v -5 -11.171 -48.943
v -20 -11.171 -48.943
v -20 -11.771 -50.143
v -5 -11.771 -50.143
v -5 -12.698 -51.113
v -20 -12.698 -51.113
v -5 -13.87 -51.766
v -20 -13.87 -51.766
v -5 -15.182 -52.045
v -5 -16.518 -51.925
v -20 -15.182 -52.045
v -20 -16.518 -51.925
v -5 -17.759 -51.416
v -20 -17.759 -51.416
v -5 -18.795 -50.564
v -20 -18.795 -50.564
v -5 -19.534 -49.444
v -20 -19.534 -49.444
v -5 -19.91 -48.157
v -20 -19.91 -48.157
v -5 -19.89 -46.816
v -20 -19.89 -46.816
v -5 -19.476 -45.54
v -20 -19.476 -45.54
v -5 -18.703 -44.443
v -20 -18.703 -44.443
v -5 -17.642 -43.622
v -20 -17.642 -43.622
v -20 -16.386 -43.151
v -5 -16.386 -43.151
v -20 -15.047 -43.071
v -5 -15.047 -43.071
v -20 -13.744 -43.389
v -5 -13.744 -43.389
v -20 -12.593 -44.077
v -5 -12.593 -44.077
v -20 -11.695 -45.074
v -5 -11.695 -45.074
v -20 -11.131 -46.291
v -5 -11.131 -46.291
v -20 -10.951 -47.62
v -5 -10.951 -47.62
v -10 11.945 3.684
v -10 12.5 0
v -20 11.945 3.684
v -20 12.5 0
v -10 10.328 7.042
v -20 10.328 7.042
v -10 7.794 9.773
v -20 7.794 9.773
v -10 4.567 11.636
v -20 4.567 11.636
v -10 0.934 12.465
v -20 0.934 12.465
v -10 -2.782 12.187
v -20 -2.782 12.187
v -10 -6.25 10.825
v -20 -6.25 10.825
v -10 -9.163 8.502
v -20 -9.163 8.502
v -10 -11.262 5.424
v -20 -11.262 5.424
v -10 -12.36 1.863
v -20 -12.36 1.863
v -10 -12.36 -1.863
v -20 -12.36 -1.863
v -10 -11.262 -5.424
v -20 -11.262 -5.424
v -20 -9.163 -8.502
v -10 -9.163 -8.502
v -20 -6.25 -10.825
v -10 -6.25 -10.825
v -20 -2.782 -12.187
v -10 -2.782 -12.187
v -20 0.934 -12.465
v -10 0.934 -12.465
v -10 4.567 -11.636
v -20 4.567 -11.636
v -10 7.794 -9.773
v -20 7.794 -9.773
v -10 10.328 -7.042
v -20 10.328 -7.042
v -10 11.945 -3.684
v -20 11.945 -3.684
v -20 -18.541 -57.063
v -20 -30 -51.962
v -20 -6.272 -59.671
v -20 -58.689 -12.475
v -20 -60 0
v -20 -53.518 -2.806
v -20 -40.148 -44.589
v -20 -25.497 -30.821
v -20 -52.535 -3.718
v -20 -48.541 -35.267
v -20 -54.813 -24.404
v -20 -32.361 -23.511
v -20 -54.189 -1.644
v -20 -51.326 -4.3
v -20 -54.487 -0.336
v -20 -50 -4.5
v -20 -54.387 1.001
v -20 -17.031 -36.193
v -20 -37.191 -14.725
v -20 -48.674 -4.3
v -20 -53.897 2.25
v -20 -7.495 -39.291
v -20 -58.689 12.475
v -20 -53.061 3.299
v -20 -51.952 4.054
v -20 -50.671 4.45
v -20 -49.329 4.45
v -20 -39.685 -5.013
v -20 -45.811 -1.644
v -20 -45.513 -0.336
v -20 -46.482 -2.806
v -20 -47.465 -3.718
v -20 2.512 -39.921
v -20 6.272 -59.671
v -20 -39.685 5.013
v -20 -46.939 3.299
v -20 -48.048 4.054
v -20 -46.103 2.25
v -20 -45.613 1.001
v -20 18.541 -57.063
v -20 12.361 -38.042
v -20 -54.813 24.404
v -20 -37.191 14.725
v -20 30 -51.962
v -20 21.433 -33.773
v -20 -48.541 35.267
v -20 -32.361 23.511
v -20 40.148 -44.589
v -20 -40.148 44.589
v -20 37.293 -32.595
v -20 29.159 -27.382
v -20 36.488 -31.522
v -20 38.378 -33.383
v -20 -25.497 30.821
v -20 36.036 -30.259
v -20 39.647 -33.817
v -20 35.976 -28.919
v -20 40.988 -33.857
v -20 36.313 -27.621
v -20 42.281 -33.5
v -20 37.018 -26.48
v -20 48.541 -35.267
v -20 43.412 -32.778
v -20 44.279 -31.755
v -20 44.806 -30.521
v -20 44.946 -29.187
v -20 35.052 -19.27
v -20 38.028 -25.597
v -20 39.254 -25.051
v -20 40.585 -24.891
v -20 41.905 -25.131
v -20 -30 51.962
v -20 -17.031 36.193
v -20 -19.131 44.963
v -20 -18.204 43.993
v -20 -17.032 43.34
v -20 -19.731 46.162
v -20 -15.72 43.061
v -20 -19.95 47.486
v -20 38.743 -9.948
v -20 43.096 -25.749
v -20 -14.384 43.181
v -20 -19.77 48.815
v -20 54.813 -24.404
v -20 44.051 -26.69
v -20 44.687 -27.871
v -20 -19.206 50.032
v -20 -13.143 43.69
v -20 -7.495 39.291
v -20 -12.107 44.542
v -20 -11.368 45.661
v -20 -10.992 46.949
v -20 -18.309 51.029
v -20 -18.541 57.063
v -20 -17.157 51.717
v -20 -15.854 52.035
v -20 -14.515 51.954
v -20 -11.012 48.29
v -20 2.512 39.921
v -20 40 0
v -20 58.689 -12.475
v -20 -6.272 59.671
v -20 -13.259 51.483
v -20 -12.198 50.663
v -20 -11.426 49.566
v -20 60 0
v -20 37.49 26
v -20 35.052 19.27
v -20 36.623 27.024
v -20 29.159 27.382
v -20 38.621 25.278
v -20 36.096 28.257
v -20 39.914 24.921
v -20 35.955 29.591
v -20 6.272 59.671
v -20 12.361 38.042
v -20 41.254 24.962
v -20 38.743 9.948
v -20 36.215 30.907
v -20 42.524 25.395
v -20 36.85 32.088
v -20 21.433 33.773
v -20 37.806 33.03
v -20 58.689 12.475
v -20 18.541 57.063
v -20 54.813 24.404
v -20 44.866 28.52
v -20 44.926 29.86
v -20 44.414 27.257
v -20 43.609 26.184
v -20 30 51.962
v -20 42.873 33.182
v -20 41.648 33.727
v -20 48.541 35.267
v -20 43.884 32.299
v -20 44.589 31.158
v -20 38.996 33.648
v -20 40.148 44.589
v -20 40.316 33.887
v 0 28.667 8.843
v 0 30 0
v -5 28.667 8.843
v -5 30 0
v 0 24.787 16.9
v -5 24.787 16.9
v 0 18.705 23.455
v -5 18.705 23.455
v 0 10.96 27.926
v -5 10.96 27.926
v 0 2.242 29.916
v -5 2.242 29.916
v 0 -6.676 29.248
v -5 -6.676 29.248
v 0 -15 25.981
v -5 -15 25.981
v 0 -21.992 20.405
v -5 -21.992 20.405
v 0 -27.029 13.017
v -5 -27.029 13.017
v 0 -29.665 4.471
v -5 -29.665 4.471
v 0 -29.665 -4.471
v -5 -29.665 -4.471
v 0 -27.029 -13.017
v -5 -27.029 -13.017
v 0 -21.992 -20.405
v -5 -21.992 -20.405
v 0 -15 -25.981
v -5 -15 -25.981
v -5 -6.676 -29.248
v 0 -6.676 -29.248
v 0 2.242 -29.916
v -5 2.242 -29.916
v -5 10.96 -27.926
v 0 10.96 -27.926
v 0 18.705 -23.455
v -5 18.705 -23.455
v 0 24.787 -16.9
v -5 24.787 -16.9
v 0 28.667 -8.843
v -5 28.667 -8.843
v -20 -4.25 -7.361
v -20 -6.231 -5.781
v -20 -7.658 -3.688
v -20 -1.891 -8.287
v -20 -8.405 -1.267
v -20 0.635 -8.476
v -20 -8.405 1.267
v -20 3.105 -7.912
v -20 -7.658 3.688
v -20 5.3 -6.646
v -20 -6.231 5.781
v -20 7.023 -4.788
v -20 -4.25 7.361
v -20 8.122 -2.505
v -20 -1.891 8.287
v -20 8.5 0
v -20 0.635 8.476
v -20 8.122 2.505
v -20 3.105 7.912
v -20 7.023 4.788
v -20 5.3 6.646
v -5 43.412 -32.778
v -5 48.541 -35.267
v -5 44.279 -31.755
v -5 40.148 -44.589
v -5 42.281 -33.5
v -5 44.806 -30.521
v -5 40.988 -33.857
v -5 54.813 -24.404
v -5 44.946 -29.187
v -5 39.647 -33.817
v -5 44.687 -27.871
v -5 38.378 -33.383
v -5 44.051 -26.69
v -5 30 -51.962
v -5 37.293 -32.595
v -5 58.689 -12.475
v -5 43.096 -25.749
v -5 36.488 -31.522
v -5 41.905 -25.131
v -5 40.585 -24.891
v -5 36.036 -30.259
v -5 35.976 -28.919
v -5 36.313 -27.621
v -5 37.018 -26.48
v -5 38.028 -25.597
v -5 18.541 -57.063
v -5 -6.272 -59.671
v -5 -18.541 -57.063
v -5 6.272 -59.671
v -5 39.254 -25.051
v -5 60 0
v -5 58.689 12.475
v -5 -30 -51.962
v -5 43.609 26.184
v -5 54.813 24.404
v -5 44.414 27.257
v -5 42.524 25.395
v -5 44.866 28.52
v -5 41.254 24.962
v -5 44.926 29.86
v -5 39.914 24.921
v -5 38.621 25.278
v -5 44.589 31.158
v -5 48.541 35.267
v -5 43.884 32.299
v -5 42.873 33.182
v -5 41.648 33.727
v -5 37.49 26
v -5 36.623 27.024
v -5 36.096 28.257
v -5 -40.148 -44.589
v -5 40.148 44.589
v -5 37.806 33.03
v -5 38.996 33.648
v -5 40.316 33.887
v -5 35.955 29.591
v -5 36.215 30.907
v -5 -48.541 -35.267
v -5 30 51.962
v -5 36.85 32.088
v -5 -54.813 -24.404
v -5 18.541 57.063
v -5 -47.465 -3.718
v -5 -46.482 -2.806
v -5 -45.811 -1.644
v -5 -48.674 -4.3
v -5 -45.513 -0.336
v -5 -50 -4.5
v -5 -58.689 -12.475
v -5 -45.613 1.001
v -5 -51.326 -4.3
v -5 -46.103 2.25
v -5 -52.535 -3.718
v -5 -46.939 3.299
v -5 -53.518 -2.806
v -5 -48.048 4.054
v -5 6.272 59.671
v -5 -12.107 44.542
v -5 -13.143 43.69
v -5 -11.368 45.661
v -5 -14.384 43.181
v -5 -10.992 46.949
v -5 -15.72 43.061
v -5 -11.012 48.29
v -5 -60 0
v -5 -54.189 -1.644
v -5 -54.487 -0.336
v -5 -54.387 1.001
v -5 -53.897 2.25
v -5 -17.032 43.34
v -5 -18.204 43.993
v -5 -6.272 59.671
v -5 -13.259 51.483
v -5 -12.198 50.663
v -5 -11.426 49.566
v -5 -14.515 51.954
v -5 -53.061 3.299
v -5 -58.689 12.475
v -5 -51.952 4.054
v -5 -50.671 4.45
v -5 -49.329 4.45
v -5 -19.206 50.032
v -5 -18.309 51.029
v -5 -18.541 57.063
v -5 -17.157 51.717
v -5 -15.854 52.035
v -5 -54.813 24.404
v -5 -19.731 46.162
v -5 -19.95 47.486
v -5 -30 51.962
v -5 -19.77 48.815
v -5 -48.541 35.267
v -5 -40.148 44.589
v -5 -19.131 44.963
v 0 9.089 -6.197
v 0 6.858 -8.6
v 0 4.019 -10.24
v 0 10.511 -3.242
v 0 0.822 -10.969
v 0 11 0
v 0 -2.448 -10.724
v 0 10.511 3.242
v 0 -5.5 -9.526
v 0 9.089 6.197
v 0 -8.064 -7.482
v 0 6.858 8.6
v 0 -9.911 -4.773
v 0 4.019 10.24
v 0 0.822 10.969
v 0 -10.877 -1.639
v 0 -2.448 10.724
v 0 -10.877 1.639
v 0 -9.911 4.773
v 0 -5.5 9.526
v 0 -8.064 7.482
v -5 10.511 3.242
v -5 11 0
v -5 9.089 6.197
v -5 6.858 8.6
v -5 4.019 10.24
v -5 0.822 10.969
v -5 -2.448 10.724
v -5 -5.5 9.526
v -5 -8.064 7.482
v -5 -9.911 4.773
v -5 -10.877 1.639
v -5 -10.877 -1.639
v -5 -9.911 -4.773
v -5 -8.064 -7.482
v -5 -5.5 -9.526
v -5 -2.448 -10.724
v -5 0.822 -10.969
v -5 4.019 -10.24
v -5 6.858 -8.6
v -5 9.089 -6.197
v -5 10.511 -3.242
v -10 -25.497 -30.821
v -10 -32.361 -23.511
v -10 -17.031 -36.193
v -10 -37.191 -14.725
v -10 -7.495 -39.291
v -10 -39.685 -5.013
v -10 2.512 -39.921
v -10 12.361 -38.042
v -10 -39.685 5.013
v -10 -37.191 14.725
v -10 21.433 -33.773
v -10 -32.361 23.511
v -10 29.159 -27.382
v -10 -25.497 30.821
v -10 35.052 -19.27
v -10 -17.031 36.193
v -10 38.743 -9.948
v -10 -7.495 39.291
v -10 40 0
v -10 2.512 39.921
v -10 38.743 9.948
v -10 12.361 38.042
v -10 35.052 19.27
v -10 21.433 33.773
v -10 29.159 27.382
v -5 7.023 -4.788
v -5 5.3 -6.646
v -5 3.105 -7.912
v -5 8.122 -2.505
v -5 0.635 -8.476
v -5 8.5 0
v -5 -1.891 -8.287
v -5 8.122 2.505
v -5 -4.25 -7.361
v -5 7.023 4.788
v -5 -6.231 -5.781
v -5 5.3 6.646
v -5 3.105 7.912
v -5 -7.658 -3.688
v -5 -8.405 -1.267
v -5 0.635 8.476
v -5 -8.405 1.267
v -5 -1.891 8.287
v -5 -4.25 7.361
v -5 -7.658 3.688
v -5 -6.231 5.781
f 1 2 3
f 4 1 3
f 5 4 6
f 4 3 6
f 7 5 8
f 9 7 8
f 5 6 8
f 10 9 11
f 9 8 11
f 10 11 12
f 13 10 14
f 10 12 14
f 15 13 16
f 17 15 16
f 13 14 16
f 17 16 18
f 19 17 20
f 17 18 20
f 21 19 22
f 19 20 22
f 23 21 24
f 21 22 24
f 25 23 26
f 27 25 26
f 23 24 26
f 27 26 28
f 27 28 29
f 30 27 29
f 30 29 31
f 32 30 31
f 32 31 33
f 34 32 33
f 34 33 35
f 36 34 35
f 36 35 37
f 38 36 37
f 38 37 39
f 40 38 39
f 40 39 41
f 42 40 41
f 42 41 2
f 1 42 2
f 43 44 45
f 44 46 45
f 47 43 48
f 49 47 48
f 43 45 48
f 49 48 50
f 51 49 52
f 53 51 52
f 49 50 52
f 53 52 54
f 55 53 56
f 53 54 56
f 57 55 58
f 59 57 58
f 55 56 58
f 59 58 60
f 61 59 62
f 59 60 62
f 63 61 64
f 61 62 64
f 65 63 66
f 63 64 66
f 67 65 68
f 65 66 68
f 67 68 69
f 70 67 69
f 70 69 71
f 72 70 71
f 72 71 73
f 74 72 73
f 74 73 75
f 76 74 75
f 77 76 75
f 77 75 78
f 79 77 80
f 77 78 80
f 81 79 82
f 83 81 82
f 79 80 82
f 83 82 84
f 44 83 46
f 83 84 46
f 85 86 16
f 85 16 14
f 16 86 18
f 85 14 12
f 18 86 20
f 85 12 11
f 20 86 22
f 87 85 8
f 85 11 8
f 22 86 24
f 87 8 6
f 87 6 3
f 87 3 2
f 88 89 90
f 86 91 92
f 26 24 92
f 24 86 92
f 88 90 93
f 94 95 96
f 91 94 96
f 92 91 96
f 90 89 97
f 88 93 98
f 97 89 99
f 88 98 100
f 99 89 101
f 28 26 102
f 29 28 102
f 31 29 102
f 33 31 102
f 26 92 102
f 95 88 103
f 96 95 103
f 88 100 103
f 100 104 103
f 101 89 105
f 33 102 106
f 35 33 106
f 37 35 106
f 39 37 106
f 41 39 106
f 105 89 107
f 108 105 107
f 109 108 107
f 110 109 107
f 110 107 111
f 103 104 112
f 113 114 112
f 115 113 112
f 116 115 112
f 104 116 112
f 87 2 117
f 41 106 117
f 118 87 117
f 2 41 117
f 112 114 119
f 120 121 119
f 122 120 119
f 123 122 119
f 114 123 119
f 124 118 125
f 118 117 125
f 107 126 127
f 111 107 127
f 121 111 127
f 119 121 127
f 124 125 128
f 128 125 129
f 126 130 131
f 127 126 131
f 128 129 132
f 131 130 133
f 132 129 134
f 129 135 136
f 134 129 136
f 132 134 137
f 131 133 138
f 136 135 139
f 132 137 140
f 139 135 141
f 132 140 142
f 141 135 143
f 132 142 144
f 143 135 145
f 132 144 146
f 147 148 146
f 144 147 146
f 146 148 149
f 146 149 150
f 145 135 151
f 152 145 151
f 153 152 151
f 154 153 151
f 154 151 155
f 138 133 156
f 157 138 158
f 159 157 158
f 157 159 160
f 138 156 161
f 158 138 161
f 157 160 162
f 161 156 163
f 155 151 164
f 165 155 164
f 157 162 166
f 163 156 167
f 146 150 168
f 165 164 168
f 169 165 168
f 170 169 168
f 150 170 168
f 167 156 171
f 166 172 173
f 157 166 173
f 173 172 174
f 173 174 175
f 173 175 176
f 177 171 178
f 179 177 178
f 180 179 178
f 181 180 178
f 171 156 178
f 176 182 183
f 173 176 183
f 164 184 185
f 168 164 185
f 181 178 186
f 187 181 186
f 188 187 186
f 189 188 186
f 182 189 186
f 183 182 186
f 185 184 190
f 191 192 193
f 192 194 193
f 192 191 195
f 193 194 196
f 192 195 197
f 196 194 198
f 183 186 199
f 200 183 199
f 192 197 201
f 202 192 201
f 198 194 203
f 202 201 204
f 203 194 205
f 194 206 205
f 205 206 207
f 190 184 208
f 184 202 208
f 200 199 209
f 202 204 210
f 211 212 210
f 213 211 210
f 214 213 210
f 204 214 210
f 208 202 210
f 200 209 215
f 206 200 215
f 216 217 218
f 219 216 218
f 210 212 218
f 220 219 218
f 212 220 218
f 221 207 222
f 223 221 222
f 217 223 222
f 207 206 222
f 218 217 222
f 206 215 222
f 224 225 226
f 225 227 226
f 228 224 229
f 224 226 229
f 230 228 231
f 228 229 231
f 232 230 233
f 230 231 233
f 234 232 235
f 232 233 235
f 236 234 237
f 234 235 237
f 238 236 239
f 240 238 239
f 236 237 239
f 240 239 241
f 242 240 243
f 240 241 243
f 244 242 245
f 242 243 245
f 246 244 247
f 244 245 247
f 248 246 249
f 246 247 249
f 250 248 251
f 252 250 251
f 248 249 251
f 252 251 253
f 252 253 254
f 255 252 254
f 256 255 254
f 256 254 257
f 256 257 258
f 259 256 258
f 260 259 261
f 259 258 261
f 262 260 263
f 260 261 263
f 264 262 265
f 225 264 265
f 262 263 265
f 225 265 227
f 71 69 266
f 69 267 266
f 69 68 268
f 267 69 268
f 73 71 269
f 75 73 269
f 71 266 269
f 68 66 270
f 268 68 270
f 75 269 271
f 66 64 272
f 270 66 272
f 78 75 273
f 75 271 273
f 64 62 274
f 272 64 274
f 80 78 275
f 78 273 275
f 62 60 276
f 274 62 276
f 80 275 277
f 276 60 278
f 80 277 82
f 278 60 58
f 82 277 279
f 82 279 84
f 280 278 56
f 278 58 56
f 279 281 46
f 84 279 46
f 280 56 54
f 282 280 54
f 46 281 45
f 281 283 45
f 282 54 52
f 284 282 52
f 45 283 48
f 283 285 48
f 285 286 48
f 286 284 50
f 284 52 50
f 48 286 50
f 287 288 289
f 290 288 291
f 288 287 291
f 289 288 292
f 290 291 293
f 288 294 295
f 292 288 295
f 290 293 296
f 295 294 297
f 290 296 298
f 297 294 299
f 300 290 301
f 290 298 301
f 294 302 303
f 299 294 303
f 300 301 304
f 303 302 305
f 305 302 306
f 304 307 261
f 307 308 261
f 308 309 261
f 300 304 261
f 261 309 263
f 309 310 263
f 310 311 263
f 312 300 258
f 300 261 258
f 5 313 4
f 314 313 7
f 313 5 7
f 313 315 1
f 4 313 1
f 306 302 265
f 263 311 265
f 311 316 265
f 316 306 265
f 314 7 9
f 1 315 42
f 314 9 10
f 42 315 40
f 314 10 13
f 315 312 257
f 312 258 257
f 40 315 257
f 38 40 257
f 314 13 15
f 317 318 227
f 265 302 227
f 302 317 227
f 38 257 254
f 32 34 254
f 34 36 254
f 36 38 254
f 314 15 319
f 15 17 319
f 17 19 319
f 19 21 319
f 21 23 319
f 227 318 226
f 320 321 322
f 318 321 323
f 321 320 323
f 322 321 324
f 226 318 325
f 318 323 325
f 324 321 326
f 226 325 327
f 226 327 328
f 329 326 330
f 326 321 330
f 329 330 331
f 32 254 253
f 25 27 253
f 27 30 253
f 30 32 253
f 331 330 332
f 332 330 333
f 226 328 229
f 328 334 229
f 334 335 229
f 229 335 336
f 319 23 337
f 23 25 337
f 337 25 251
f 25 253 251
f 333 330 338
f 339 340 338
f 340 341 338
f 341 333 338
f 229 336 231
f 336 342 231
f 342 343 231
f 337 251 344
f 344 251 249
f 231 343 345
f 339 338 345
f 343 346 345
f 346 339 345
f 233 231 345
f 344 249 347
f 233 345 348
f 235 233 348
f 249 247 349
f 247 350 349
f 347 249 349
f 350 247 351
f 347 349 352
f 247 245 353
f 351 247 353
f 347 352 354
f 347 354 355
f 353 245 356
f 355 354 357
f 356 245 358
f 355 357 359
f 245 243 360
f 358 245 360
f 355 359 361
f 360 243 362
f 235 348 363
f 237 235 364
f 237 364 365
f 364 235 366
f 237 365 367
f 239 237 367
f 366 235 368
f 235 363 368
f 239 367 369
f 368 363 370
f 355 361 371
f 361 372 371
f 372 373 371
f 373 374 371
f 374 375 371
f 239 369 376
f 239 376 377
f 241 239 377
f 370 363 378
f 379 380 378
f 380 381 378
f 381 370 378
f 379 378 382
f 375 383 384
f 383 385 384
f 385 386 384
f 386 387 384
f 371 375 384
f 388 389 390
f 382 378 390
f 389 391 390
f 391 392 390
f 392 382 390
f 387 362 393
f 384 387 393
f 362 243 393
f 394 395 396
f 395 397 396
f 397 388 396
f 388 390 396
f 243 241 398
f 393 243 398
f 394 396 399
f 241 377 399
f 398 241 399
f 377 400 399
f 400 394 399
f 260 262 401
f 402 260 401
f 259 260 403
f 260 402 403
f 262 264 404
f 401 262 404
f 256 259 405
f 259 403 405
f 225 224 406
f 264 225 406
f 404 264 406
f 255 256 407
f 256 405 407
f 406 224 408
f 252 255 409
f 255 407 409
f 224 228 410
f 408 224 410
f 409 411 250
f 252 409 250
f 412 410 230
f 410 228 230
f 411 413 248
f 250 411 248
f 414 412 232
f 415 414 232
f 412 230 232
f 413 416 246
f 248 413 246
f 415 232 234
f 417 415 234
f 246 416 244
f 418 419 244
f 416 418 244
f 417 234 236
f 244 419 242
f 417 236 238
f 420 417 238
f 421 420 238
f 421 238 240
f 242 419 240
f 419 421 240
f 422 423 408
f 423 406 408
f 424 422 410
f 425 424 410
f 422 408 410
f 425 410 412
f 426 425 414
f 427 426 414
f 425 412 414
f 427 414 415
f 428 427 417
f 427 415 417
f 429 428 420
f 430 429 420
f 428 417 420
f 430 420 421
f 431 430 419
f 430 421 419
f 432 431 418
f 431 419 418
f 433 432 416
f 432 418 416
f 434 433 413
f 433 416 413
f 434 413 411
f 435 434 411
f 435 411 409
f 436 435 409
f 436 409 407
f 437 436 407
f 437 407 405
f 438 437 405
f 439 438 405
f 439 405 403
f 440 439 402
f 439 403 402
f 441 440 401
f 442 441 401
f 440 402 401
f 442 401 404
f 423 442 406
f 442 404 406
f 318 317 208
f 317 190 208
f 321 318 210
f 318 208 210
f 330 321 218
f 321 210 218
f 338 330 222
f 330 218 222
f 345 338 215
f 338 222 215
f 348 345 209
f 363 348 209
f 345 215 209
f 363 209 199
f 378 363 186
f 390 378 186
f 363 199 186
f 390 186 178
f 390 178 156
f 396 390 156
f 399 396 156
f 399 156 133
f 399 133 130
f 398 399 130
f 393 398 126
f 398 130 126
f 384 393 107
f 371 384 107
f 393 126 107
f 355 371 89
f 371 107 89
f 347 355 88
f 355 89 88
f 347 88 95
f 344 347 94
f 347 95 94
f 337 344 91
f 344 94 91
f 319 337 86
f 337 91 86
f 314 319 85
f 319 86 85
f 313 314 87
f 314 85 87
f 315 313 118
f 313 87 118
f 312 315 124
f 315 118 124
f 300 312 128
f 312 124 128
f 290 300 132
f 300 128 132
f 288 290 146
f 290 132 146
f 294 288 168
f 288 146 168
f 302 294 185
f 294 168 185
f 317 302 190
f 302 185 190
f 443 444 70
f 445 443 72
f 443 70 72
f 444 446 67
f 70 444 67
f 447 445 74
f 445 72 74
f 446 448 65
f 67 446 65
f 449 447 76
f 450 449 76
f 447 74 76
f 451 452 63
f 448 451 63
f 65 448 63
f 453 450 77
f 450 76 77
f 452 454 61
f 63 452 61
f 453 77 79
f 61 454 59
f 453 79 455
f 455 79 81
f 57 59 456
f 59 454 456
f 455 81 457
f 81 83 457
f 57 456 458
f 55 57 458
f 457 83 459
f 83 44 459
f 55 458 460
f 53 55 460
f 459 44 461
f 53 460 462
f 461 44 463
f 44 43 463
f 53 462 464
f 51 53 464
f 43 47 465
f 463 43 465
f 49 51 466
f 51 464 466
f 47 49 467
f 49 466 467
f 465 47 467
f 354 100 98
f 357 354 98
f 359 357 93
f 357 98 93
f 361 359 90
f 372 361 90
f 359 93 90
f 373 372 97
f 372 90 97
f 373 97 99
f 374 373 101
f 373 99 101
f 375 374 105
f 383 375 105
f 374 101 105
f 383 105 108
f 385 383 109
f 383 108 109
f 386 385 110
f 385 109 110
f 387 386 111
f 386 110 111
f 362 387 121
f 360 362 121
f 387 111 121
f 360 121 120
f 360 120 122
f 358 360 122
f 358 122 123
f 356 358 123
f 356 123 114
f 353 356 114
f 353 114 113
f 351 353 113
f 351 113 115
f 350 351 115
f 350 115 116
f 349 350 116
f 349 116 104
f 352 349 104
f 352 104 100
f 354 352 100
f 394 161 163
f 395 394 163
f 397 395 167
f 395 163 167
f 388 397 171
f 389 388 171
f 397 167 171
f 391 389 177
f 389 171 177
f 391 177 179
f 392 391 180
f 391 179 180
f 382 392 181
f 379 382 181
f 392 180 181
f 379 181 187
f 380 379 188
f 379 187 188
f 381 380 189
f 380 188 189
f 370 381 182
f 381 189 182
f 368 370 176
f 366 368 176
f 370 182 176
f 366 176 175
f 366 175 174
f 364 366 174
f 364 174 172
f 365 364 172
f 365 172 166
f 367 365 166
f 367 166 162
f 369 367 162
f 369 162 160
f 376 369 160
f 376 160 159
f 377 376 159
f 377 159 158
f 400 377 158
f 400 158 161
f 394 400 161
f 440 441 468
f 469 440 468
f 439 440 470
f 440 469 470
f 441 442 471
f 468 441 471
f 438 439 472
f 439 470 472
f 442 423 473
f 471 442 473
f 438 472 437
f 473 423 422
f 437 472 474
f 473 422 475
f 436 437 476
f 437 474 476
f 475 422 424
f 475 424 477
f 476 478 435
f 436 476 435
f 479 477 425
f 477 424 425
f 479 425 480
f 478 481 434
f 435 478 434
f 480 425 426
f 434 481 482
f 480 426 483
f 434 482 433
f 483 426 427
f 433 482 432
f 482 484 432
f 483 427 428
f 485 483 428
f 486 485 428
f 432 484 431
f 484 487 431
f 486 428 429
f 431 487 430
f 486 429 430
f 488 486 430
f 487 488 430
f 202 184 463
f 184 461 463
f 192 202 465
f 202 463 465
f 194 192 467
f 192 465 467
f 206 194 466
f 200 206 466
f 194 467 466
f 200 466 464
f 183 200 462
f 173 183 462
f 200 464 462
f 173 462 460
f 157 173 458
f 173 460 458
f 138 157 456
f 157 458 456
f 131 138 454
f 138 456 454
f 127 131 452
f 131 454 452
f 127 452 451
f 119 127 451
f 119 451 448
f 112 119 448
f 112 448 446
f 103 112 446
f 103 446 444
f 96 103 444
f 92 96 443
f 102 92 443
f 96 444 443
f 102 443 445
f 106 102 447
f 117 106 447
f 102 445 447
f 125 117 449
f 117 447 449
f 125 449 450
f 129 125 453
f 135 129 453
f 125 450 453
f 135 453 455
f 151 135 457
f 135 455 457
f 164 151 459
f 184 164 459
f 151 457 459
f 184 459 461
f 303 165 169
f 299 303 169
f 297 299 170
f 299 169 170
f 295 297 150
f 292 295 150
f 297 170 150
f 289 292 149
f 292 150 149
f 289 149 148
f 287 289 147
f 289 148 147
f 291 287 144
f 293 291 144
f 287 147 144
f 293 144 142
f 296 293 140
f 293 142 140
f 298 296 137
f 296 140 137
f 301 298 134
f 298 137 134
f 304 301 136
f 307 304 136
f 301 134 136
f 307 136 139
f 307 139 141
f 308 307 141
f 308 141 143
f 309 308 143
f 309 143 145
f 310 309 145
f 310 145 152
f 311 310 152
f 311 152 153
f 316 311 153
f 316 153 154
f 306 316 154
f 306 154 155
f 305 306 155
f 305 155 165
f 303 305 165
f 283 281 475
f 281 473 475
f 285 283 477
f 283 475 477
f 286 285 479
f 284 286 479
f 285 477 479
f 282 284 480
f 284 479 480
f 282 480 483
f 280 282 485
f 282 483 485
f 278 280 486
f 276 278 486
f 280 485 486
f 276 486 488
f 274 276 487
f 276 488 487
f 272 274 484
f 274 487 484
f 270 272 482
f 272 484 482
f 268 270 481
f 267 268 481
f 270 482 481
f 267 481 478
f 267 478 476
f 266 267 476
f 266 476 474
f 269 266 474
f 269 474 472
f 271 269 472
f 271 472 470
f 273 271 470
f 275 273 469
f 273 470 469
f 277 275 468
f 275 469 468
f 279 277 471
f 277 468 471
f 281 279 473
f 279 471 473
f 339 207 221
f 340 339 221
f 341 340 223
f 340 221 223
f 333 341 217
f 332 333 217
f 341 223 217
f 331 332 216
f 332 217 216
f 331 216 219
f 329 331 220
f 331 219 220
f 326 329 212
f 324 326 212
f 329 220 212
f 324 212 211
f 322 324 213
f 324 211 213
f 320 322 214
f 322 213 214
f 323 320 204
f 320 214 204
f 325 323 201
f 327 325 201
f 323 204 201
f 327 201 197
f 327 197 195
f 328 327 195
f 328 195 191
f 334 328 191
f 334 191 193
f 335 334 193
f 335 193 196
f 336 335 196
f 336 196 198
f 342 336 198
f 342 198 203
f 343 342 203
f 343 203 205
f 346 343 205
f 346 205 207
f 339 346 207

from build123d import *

# Parameters (mm, degrees)
M8_CLEARANCE_HOLE1_D     = 9
M8_CLEARANCE_HOLE1_DEPTH = 15
CIRPATTERN1_COUNT        = 5


with BuildPart() as part:
    # Sketch2 → Revolve1 (revolve)
    with BuildSketch(Plane.XY):
        Polygon((-5, 11), (0, 11), (0, 30), (-5, 30), (-5, 60), (-20, 60), (-20, 40), (-10, 40), (-10, 12.5), (-20, 12.5), (-20, 8.5), (-5, 8.5), align=None)
    revolve(axis=Axis((-20, 0, 0), (1, 0, 0)))

    # M8 Clearance Hole1
    with Locations(Plane(origin=(-5, -50, 0), x_dir=(0, 0, 1), z_dir=(1, 0, 0))):
        with Locations((0, 0)):
            m8_clearance_hole1 = Hole(M8_CLEARANCE_HOLE1_D / 2, depth=M8_CLEARANCE_HOLE1_DEPTH)

    # CirPattern1: M8 Clearance Hole1 ×5 about axis
    cirpattern1_axis = Axis((0, 0, 0), (1, 0, 0))
    for i in range(1, CIRPATTERN1_COUNT):
        add(m8_clearance_hole1.rotate(cirpattern1_axis, i * 360 / CIRPATTERN1_COUNT), mode=Mode.SUBTRACT)


solid = part.part
